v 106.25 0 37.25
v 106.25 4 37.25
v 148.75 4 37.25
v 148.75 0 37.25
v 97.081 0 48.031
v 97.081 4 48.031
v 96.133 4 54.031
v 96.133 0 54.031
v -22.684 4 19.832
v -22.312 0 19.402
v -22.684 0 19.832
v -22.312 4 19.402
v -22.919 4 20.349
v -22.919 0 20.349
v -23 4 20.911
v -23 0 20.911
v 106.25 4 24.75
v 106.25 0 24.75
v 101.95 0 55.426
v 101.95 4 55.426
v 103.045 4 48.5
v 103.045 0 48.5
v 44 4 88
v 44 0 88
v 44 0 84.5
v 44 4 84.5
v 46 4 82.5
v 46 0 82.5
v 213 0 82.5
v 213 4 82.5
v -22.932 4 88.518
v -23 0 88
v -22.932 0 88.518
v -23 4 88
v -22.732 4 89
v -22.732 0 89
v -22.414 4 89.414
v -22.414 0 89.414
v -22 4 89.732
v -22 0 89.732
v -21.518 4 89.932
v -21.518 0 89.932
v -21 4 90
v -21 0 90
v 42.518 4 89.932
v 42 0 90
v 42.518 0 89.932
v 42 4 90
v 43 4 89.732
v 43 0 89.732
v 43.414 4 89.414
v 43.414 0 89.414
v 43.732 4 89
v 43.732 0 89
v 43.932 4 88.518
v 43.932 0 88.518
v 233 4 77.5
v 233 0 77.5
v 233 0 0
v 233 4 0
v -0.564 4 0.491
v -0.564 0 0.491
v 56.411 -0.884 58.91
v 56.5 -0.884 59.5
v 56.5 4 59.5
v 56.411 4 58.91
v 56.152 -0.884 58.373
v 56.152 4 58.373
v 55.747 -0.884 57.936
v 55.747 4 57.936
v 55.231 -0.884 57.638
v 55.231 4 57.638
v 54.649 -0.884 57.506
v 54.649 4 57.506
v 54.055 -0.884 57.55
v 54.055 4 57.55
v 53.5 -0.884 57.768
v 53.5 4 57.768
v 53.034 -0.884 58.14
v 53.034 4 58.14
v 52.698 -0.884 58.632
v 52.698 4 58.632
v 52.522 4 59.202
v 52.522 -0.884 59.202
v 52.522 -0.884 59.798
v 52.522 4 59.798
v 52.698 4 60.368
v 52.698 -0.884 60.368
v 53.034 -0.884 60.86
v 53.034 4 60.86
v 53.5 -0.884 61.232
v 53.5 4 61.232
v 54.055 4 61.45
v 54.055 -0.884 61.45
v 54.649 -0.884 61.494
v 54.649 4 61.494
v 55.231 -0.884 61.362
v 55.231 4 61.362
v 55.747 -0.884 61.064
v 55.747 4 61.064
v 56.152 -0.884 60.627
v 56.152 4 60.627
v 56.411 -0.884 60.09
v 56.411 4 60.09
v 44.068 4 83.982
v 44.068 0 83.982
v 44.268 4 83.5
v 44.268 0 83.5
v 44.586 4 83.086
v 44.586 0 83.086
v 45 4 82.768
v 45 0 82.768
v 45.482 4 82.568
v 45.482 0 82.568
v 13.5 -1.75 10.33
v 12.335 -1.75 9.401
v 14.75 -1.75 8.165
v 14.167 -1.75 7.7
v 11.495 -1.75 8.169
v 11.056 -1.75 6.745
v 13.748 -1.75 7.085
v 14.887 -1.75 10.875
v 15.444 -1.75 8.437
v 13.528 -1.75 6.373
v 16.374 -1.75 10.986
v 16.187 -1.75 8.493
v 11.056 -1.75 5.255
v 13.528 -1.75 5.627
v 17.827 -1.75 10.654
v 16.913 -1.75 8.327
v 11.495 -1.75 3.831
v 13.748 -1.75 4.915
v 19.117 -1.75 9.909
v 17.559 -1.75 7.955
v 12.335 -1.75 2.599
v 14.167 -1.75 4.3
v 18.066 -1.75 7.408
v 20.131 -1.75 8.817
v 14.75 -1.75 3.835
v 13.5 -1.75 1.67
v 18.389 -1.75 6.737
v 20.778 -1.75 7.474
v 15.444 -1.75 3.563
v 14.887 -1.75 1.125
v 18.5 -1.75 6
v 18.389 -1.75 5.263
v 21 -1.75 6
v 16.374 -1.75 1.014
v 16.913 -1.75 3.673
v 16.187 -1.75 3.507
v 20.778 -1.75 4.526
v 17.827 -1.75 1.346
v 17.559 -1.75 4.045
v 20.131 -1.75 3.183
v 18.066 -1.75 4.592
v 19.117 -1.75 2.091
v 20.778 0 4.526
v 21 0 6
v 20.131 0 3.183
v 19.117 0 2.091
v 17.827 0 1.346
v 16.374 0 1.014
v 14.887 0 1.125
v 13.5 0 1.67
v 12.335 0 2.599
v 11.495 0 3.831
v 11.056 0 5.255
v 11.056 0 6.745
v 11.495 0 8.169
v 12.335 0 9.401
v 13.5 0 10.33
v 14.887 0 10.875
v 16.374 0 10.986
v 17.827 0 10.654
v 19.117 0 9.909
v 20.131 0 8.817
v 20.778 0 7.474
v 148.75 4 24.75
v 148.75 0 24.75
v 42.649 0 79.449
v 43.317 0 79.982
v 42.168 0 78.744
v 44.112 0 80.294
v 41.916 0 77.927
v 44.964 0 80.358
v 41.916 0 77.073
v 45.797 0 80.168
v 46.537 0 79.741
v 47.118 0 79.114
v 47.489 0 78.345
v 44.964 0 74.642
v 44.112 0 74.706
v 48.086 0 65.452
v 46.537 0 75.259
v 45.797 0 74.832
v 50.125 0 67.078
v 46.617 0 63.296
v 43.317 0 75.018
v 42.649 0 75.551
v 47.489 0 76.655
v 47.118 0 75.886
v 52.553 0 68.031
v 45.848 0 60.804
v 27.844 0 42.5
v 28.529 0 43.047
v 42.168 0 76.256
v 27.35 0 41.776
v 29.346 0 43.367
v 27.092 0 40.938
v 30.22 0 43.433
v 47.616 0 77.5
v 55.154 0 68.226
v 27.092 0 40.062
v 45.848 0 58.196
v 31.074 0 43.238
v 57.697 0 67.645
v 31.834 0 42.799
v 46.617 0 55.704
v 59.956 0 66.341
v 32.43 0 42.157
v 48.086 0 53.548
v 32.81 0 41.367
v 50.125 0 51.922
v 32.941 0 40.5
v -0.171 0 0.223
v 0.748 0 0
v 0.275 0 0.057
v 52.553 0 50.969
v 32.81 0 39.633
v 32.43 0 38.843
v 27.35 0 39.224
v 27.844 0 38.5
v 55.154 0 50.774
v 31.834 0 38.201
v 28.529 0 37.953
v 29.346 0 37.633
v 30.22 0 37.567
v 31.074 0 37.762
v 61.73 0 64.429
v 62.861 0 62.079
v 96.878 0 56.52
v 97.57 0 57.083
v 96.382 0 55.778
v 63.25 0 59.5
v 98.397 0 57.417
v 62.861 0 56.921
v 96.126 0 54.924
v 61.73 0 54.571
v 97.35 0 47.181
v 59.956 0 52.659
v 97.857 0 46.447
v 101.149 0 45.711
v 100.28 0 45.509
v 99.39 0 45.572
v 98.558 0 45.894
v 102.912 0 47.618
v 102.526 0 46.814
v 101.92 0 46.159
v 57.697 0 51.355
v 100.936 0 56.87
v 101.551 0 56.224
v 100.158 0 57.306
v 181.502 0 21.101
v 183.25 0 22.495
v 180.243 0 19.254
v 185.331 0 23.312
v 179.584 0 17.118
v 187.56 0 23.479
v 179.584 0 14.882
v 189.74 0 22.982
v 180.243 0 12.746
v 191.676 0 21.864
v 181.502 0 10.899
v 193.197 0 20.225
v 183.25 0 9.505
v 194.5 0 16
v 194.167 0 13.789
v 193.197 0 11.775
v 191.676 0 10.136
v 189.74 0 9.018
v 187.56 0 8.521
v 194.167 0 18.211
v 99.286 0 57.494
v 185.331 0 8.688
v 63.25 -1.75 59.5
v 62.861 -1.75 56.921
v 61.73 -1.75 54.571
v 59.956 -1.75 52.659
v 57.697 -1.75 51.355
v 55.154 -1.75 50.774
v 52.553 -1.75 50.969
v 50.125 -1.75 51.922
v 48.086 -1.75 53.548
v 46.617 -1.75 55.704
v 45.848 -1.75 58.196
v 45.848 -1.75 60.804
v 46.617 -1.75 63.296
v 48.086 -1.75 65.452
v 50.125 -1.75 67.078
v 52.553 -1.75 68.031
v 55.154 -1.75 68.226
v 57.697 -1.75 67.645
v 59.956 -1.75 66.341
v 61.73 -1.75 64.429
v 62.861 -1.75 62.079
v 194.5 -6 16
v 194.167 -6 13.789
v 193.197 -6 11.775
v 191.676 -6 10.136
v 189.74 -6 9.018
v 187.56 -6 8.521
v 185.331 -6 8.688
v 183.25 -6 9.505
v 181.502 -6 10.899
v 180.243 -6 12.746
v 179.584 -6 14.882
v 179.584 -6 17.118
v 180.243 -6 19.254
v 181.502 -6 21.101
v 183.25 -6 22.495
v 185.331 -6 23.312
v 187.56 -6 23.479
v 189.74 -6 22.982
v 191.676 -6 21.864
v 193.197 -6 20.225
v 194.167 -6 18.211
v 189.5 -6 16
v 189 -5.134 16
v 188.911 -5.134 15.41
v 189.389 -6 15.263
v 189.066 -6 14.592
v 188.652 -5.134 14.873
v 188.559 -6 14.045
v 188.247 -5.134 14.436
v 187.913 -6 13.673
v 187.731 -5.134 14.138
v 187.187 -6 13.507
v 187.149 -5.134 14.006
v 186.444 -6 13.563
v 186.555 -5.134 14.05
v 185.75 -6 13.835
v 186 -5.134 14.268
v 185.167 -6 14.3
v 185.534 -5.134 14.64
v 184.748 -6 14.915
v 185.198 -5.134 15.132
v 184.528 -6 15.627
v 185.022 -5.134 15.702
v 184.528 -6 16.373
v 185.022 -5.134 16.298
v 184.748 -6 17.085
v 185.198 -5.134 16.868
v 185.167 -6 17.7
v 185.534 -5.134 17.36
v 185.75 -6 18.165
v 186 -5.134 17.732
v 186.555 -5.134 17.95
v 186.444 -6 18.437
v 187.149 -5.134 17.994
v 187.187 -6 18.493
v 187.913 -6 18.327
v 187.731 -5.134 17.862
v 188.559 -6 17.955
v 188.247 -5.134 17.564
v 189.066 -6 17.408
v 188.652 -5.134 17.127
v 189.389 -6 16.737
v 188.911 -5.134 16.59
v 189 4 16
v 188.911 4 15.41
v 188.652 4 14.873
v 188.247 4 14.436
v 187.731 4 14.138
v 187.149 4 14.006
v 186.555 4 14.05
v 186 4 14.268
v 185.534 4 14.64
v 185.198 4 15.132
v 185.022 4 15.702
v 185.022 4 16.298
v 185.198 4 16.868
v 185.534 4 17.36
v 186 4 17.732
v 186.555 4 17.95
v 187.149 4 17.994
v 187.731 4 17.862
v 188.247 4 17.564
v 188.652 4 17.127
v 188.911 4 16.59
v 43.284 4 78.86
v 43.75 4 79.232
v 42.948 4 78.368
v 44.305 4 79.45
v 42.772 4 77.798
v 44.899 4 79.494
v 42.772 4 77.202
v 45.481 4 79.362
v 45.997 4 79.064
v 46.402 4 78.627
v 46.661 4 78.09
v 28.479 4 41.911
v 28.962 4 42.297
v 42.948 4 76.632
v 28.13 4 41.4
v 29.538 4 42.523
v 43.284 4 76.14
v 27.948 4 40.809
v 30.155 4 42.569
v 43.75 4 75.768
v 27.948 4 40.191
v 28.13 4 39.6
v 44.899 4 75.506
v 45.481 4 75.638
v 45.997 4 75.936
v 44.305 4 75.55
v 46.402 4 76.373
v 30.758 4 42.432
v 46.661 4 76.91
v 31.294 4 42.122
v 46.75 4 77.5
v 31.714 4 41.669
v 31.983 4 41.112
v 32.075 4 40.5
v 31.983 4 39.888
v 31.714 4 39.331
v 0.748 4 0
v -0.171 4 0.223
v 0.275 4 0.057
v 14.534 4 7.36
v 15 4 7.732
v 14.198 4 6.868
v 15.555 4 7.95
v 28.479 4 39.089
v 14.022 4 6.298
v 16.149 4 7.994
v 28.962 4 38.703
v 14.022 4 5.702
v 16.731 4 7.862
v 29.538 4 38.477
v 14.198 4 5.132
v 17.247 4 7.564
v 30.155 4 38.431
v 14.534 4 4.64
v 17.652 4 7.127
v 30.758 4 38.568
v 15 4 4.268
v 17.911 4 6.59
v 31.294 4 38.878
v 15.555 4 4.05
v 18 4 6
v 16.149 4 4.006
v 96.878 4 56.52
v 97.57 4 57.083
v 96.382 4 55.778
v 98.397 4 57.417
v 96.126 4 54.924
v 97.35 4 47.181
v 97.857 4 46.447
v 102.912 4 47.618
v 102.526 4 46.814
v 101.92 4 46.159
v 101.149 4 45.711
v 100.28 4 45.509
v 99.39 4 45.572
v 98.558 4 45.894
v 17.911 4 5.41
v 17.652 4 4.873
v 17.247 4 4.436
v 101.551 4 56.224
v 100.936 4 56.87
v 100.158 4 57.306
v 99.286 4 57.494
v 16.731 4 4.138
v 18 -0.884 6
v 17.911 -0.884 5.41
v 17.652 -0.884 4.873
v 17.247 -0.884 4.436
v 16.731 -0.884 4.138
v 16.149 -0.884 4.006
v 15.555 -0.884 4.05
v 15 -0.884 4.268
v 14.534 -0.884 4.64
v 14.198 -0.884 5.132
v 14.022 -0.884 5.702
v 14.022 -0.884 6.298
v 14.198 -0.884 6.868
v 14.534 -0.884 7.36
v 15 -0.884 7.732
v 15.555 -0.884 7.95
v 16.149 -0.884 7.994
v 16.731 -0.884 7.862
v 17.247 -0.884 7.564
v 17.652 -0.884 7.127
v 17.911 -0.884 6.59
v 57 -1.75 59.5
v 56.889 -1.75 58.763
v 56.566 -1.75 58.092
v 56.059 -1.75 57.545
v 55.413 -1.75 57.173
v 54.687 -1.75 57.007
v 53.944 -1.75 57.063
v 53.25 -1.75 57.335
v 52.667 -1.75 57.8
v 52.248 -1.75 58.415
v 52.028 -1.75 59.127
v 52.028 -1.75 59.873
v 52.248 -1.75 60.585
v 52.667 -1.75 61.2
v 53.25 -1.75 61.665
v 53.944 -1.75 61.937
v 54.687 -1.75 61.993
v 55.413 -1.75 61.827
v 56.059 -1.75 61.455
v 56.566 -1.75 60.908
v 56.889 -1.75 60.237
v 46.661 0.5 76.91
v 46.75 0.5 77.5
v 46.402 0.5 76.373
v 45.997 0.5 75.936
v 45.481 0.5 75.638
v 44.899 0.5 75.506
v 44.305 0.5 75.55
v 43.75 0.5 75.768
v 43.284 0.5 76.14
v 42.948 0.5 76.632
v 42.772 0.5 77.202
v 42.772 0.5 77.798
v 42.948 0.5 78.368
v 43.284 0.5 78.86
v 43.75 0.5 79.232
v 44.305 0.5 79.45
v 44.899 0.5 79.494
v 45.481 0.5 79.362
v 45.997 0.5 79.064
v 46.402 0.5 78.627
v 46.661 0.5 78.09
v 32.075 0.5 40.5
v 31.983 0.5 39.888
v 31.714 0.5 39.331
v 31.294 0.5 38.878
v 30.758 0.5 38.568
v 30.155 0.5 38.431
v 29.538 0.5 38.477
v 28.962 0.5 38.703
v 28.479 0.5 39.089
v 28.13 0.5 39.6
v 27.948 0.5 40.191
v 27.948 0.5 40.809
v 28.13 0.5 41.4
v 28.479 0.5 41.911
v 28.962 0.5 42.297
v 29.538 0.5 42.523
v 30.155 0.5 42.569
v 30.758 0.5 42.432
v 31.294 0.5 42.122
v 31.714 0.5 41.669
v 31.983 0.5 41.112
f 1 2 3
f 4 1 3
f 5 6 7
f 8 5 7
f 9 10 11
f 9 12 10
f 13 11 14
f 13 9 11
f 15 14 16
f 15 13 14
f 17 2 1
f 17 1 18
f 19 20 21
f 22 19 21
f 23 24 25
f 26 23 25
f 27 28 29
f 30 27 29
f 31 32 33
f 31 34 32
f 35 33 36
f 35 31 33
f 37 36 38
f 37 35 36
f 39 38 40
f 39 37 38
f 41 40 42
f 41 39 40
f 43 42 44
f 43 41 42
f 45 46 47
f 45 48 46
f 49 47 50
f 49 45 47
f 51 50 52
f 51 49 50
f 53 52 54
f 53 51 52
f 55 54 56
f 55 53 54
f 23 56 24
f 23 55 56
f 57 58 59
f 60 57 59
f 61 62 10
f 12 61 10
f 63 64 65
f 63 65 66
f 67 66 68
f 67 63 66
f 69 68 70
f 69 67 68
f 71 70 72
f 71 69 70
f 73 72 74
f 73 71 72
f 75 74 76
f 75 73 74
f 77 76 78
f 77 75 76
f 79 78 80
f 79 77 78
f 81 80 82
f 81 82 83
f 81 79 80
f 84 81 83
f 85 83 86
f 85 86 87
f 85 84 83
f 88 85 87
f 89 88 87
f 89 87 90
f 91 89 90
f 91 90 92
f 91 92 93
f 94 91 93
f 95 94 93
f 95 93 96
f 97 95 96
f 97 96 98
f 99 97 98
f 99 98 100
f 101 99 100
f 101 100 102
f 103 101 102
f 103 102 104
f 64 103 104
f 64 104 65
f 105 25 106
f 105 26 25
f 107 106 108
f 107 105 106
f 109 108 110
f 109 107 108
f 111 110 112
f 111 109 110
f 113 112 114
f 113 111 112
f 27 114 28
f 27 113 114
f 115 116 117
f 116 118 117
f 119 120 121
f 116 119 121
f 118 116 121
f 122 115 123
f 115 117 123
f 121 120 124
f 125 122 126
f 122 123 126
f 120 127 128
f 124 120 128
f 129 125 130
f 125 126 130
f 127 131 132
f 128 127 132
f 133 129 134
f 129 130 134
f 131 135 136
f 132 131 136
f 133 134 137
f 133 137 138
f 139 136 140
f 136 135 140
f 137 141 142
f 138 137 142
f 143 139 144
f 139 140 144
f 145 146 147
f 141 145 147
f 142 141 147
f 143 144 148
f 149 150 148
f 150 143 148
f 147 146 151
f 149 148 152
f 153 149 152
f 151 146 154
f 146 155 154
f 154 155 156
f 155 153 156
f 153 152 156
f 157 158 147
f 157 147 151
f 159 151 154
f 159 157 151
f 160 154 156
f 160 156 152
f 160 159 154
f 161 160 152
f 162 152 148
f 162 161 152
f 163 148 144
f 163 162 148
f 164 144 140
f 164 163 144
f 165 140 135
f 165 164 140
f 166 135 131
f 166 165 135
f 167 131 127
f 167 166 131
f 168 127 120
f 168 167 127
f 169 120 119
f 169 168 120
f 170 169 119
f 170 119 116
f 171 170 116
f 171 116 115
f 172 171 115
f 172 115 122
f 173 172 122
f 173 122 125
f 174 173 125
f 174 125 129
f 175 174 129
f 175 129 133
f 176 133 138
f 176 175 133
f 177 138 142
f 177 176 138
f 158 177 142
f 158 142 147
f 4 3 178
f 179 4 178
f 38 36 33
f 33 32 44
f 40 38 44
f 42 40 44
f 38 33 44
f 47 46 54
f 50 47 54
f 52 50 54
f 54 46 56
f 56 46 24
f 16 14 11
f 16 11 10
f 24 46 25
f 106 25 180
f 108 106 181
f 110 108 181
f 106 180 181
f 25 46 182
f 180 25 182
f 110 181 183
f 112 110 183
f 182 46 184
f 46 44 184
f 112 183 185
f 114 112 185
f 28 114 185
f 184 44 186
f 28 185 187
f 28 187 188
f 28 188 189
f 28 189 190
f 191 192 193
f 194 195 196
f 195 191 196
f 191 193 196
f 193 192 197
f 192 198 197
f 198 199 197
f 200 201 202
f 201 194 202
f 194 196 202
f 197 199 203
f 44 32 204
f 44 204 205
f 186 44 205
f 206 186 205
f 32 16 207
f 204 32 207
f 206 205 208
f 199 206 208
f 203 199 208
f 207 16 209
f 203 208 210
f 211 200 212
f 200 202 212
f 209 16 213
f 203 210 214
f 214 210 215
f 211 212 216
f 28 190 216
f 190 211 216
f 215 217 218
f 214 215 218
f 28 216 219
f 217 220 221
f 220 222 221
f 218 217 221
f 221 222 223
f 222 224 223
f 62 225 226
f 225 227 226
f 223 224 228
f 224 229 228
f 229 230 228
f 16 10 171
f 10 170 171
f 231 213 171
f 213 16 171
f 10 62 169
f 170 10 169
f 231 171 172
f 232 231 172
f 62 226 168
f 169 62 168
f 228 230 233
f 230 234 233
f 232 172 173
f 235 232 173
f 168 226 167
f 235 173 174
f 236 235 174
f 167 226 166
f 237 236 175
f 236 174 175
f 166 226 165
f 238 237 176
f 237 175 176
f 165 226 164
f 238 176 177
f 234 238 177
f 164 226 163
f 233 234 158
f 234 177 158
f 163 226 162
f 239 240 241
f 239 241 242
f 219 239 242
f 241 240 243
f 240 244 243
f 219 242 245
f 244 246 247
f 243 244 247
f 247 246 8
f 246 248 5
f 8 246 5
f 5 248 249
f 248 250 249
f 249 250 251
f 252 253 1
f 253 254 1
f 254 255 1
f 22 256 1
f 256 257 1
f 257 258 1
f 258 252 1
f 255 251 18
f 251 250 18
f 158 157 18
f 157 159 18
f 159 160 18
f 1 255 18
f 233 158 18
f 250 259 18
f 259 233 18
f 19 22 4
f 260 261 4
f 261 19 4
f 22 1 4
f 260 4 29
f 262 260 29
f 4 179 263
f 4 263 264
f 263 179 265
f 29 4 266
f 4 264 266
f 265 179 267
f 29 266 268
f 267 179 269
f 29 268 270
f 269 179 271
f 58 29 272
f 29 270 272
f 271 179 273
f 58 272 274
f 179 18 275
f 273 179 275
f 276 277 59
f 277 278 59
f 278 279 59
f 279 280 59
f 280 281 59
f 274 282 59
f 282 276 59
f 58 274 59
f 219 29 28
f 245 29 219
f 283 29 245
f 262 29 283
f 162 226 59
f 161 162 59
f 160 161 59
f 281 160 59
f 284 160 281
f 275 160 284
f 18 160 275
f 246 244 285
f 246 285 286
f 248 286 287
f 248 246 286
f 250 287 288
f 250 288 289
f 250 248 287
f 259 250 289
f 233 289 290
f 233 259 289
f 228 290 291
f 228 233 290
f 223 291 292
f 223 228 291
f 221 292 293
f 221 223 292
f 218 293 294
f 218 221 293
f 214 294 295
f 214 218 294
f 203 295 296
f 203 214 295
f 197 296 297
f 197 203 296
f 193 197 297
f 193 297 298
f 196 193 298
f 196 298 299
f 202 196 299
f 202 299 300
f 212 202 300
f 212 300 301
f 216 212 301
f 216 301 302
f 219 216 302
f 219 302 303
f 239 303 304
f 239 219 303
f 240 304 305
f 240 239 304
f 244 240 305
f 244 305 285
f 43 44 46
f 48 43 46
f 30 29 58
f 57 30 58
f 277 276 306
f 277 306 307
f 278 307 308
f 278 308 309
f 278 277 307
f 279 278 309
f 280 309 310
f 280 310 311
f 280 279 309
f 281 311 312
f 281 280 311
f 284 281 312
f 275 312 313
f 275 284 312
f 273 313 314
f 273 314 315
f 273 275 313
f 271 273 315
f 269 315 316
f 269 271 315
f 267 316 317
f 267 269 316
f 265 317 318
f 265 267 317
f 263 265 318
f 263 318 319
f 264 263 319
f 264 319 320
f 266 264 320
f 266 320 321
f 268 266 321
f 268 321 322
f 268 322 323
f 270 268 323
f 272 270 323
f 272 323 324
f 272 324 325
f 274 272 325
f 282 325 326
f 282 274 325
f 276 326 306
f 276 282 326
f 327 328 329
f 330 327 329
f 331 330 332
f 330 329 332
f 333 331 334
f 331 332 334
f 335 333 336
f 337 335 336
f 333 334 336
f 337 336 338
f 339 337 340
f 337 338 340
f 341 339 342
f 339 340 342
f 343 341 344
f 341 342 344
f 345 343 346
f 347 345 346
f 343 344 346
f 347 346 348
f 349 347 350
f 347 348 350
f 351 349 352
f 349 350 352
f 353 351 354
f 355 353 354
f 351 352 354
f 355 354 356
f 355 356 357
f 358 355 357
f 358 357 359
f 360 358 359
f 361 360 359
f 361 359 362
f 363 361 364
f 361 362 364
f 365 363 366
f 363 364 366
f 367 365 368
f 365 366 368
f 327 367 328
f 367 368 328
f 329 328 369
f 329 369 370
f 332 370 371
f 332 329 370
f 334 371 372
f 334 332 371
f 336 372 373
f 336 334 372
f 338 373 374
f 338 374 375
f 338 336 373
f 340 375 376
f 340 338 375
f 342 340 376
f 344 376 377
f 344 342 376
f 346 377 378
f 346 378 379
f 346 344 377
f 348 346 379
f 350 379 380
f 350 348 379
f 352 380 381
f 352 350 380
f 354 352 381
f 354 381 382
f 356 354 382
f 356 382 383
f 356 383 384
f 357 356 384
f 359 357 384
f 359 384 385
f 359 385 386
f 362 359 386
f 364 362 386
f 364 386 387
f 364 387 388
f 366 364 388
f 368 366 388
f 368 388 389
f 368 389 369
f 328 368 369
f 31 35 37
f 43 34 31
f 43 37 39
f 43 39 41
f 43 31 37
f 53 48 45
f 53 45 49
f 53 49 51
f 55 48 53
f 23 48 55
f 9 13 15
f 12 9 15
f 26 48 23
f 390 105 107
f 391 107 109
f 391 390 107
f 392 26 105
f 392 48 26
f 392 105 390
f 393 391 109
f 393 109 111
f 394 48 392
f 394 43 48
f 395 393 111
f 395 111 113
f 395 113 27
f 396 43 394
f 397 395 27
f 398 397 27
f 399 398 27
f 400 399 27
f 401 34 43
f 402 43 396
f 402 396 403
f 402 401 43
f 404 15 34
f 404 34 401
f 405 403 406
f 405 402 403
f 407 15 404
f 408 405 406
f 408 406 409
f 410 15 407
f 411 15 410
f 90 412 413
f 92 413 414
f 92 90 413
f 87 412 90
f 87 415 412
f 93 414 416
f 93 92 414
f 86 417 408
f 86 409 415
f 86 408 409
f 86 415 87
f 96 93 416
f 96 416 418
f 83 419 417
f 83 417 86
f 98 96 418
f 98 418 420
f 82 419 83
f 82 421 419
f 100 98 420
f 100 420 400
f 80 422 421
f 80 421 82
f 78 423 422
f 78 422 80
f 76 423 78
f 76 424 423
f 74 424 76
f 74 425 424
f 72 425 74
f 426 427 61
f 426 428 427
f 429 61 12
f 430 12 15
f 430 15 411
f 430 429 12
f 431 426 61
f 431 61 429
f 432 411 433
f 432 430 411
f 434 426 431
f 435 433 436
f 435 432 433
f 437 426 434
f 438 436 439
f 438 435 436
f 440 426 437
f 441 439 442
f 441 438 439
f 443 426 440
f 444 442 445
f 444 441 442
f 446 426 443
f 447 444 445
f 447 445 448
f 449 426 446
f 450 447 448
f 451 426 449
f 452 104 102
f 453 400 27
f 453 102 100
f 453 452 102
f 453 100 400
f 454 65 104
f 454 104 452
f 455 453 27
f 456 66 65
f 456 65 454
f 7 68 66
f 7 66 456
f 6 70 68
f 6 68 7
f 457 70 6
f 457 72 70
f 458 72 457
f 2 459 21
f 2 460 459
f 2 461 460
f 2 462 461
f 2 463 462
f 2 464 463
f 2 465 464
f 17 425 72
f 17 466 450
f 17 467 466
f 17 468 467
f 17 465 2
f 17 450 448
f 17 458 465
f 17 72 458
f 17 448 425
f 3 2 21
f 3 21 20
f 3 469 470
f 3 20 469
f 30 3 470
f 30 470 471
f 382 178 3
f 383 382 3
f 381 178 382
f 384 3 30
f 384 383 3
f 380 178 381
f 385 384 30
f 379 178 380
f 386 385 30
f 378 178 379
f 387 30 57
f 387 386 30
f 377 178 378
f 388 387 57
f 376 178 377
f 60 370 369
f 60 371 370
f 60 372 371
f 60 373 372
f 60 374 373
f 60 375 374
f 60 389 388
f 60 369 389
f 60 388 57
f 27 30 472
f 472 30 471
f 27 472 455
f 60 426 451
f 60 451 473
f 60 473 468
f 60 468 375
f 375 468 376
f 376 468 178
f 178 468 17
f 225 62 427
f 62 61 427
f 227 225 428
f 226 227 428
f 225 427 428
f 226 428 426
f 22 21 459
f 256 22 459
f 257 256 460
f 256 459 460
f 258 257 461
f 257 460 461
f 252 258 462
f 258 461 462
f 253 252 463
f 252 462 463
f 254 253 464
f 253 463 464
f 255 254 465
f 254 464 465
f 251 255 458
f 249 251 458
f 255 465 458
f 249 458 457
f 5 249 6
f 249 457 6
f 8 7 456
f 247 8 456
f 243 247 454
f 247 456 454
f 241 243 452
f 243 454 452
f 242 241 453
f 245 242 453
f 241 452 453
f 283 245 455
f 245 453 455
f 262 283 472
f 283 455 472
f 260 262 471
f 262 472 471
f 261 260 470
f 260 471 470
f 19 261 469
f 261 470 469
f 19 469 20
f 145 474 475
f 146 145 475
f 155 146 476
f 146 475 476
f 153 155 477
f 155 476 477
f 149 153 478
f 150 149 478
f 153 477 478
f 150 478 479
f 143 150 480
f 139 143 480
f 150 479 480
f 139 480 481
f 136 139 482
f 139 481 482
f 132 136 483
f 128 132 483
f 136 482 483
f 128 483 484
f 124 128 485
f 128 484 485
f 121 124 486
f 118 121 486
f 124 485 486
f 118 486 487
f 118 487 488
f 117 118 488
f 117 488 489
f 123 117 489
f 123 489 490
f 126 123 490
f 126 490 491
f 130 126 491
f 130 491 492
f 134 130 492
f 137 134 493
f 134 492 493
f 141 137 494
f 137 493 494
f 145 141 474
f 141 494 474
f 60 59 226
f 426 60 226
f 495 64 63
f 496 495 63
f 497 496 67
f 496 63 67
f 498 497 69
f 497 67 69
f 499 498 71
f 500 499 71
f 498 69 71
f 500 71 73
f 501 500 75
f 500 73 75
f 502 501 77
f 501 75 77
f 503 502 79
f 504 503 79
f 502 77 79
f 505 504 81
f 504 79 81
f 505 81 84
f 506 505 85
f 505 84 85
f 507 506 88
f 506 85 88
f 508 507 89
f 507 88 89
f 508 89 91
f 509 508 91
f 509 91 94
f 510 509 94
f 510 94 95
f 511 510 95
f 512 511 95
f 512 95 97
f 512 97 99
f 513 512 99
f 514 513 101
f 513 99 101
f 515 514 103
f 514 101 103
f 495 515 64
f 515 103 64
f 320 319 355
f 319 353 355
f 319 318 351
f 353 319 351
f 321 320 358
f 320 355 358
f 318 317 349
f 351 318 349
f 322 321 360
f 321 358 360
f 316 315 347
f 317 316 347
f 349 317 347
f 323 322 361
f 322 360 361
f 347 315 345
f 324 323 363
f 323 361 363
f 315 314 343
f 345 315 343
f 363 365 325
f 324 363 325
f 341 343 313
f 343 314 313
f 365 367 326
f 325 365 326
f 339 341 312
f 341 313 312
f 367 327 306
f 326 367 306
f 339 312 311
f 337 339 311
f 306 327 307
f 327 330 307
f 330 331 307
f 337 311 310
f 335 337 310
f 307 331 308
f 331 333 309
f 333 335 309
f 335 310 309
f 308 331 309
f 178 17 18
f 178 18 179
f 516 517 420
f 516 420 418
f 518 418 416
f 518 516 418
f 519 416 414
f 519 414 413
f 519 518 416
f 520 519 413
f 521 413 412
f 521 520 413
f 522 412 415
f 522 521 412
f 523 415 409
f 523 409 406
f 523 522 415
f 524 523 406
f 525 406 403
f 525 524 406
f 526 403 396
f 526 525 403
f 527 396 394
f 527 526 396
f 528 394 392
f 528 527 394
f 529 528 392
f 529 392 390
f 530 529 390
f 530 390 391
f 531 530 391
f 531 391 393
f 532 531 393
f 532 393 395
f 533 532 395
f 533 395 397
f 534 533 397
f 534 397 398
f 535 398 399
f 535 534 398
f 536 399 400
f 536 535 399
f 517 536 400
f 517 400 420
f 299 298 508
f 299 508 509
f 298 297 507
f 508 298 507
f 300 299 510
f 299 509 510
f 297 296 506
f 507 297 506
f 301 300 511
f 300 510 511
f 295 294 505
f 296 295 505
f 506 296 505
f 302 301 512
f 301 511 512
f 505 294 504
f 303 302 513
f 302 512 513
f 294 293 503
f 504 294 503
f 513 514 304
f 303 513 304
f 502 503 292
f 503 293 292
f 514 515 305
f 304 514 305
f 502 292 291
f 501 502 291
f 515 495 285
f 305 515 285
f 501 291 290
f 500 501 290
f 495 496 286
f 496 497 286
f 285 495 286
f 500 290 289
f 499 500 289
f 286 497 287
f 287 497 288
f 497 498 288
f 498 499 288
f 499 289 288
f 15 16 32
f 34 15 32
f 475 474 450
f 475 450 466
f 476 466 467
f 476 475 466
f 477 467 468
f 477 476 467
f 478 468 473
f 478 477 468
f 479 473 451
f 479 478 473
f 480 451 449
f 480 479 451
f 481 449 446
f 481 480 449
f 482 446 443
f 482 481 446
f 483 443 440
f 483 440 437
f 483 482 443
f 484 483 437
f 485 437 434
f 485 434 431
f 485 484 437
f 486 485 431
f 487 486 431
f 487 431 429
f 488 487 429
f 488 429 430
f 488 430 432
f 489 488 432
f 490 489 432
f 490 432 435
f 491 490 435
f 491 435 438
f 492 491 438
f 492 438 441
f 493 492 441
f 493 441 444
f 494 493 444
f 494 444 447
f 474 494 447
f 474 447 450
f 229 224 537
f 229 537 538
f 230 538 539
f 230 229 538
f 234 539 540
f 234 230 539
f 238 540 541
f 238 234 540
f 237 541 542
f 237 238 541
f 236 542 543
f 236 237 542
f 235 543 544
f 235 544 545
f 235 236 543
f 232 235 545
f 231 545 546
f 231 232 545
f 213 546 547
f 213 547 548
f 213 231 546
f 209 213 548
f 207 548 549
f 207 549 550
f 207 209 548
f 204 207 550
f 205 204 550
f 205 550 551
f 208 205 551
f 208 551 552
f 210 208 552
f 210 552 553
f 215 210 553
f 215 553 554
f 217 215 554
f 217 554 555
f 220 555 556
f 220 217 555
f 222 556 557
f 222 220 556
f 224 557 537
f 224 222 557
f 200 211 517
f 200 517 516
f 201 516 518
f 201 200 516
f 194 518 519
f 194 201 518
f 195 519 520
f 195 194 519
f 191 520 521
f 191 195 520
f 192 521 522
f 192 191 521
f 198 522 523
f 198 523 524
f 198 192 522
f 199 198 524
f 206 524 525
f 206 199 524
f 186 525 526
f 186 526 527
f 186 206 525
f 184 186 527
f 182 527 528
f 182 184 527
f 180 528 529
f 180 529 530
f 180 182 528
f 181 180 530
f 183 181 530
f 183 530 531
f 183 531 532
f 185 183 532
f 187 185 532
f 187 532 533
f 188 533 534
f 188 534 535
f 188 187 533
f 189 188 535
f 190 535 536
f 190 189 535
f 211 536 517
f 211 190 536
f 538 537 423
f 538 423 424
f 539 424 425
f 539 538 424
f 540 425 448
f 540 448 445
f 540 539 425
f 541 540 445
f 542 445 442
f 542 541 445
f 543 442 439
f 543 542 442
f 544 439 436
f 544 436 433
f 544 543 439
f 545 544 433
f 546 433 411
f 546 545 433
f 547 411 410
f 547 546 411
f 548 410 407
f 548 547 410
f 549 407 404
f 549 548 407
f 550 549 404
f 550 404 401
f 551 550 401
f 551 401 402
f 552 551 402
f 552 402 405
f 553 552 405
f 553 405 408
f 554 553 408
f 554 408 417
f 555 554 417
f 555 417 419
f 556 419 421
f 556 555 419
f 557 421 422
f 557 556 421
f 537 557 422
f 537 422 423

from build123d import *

# Parameters (mm, degrees)
SKETCH1_R               = 2
SKETCH1_R_2             = 2.075
PRIMARY_DEPTH           = 4
SWINGYBIT_PIN_START     = -4
SKETCH7_R               = 7.5
SKETCH7_R_2             = 2
SWINGYBIT_PIN_EXT_DEPTH = 6
WHEEL_PIN_START         = -4
SKETCH8_R               = 5
SKETCH8_R_2             = 2
SKETCH8_R_3             = 8.75
WHEEL_PIN_EXT_DEPTH     = 1.75
SKETCH10_W              = 42.5
SKETCH10_H              = 12.5
WINDOW_CUT_DEPTH        = 11
FILLET1_R               = 2
CHAMFER1_SIZE           = 0.5
CHAMFER1_SIZE2          = 0.866025404
CHAMFER1_PART_2_SIZE    = 0.5
CHAMFER1_PART_2_SIZE2   = 0.866025404
CHAMFER1_PART_3_SIZE    = 0.5
CHAMFER1_PART_3_SIZE2   = 0.866025404
CHAMFER1_PART_4_SIZE    = 0.5
CHAMFER1_PART_4_SIZE2   = 0.866025404
CHAMFER1_PART_5_SIZE    = 0.5
CHAMFER1_PART_5_SIZE2   = 0.866025404


with BuildPart() as part:
    # Sketch1 → Primary (new body)
    with BuildSketch(Plane(origin=(0, 0, 0), x_dir=(1, 0, 0), z_dir=(0, 1, 0))):
        Polygon((0, 0), (-23, -20), (-23, -90), (44, -90), (44, -82.5), (213, -82.5), (233, -77.5), (233, 0), align=None)
        with Locations((16, -6)):
            Circle(SKETCH1_R, mode=Mode.SUBTRACT)
        with Locations((30, -40.5)):
            Circle(SKETCH1_R_2, mode=Mode.SUBTRACT)
        with Locations((54.5, -59.5)):
            Circle(SKETCH1_R, mode=Mode.SUBTRACT)
        with Locations((44.75, -77.5)):
            Circle(SKETCH1_R, mode=Mode.SUBTRACT)
        with Locations((187, -16)):
            Circle(SKETCH1_R, mode=Mode.SUBTRACT)
    extrude(amount=PRIMARY_DEPTH)

    # Sketch7 → Swingybit_Pin Ext (add)
    with BuildSketch(Plane(origin=(0, 4, 0), x_dir=(1, 0, 0), z_dir=(0, 1, 0)).offset(SWINGYBIT_PIN_START)):
        with Locations((187, -16)):
            Circle(SKETCH7_R)
        with Locations((187, -16)):
            Circle(SKETCH7_R_2, mode=Mode.SUBTRACT)
    extrude(amount=-SWINGYBIT_PIN_EXT_DEPTH)

    # Sketch8 → Wheel_Pin Ext (add)
    with BuildSketch(Plane(origin=(0, 4, 0), x_dir=(1, 0, 0), z_dir=(0, 1, 0)).offset(WHEEL_PIN_START)):
        with Locations((16, -6)):
            Circle(SKETCH8_R)
        with Locations((16, -6)):
            Circle(SKETCH8_R_2, mode=Mode.SUBTRACT)
        with Locations((54.5, -59.5)):
            Circle(SKETCH8_R_3)
        with Locations((54.5, -59.5)):
            Circle(SKETCH8_R_2, mode=Mode.SUBTRACT)
    extrude(amount=-WHEEL_PIN_EXT_DEPTH)

    # Sketch10 → Window Cut (cut, through all)
    with BuildSketch(Plane(origin=(0, 4, 0), x_dir=(1, 0, 0), z_dir=(0, 1, 0))):
        with Locations((127.5, -31)):
            Rectangle(SKETCH10_W, SKETCH10_H)
        with BuildLine():
            Line((97.081439654, -48.031479895), (96.132758806, -54.031479895))
            ThreePointArc((96.132758806, -54.031479895), (98.396768435, -57.417387228), (101.949607057, -55.425542407))
            Line((101.949607057, -55.425542407), (103.044628631, -48.5))
            ThreePointArc((103.044628631, -48.5), (100.279610619, -45.509216914), (97.081439654, -48.031479895))
        make_face()
    extrude(amount=-WINDOW_CUT_DEPTH, mode=Mode.SUBTRACT)

    # Fillet1
    fillet1_edges = [part.edges().sort_by_distance(p)[0] for p in [
        (44, 2, 82.5),
        (0, 2, 0),
        (-23, 2, 20),
        (-23, 2, 90),
        (44, 2, 90),
    ]]
    fillet(fillet1_edges, radius=FILLET1_R)

    # Chamfer1
    chamfer1_edges = [part.edges().sort_by_distance(p)[0] for p in [
        (27.925, 0, 40.5),
    ]]
    chamfer1_side = [part.faces().sort_by_distance(p)[0] for p in [
        (27.925, 2, 40.5),
    ]]
    chamfer(chamfer1_edges, length=CHAMFER1_SIZE, length2=CHAMFER1_SIZE2, reference=chamfer1_side[0])

    # Chamfer1 part 2
    chamfer1_part_2_edges = [part.edges().sort_by_distance(p)[0] for p in [
        (42.75, 0, 77.5),
    ]]
    chamfer1_part_2_side = [part.faces().sort_by_distance(p)[0] for p in [
        (42.75, 2, 77.5),
    ]]
    chamfer(chamfer1_part_2_edges, length=CHAMFER1_PART_2_SIZE, length2=CHAMFER1_PART_2_SIZE2, reference=chamfer1_part_2_side[0])

    # Chamfer1 part 3
    chamfer1_part_3_edges = [part.edges().sort_by_distance(p)[0] for p in [
        (185, -6, 16),
    ]]
    chamfer1_part_3_side = [part.faces().sort_by_distance(p)[0] for p in [
        (179.712132034, -6, 16),
    ]]
    chamfer(chamfer1_part_3_edges, length=CHAMFER1_PART_3_SIZE, length2=CHAMFER1_PART_3_SIZE2, reference=chamfer1_part_3_side[0])

    # Chamfer1 part 4
    chamfer1_part_4_edges = [part.edges().sort_by_distance(p)[0] for p in [
        (14, -1.75, 6),
    ]]
    chamfer1_part_4_side = [part.faces().sort_by_distance(p)[0] for p in [
        (11.141421356, -1.75, 6),
    ]]
    chamfer(chamfer1_part_4_edges, length=CHAMFER1_PART_4_SIZE, length2=CHAMFER1_PART_4_SIZE2, reference=chamfer1_part_4_side[0])

    # Chamfer1 part 5
    chamfer1_part_5_edges = [part.edges().sort_by_distance(p)[0] for p in [
        (52.5, -1.75, 59.5),
    ]]
    chamfer1_part_5_side = [part.faces().sort_by_distance(p)[0] for p in [
        (45.997487373, -1.75, 59.5),
    ]]
    chamfer(chamfer1_part_5_edges, length=CHAMFER1_PART_5_SIZE, length2=CHAMFER1_PART_5_SIZE2, reference=chamfer1_part_5_side[0])


solid = part.part
